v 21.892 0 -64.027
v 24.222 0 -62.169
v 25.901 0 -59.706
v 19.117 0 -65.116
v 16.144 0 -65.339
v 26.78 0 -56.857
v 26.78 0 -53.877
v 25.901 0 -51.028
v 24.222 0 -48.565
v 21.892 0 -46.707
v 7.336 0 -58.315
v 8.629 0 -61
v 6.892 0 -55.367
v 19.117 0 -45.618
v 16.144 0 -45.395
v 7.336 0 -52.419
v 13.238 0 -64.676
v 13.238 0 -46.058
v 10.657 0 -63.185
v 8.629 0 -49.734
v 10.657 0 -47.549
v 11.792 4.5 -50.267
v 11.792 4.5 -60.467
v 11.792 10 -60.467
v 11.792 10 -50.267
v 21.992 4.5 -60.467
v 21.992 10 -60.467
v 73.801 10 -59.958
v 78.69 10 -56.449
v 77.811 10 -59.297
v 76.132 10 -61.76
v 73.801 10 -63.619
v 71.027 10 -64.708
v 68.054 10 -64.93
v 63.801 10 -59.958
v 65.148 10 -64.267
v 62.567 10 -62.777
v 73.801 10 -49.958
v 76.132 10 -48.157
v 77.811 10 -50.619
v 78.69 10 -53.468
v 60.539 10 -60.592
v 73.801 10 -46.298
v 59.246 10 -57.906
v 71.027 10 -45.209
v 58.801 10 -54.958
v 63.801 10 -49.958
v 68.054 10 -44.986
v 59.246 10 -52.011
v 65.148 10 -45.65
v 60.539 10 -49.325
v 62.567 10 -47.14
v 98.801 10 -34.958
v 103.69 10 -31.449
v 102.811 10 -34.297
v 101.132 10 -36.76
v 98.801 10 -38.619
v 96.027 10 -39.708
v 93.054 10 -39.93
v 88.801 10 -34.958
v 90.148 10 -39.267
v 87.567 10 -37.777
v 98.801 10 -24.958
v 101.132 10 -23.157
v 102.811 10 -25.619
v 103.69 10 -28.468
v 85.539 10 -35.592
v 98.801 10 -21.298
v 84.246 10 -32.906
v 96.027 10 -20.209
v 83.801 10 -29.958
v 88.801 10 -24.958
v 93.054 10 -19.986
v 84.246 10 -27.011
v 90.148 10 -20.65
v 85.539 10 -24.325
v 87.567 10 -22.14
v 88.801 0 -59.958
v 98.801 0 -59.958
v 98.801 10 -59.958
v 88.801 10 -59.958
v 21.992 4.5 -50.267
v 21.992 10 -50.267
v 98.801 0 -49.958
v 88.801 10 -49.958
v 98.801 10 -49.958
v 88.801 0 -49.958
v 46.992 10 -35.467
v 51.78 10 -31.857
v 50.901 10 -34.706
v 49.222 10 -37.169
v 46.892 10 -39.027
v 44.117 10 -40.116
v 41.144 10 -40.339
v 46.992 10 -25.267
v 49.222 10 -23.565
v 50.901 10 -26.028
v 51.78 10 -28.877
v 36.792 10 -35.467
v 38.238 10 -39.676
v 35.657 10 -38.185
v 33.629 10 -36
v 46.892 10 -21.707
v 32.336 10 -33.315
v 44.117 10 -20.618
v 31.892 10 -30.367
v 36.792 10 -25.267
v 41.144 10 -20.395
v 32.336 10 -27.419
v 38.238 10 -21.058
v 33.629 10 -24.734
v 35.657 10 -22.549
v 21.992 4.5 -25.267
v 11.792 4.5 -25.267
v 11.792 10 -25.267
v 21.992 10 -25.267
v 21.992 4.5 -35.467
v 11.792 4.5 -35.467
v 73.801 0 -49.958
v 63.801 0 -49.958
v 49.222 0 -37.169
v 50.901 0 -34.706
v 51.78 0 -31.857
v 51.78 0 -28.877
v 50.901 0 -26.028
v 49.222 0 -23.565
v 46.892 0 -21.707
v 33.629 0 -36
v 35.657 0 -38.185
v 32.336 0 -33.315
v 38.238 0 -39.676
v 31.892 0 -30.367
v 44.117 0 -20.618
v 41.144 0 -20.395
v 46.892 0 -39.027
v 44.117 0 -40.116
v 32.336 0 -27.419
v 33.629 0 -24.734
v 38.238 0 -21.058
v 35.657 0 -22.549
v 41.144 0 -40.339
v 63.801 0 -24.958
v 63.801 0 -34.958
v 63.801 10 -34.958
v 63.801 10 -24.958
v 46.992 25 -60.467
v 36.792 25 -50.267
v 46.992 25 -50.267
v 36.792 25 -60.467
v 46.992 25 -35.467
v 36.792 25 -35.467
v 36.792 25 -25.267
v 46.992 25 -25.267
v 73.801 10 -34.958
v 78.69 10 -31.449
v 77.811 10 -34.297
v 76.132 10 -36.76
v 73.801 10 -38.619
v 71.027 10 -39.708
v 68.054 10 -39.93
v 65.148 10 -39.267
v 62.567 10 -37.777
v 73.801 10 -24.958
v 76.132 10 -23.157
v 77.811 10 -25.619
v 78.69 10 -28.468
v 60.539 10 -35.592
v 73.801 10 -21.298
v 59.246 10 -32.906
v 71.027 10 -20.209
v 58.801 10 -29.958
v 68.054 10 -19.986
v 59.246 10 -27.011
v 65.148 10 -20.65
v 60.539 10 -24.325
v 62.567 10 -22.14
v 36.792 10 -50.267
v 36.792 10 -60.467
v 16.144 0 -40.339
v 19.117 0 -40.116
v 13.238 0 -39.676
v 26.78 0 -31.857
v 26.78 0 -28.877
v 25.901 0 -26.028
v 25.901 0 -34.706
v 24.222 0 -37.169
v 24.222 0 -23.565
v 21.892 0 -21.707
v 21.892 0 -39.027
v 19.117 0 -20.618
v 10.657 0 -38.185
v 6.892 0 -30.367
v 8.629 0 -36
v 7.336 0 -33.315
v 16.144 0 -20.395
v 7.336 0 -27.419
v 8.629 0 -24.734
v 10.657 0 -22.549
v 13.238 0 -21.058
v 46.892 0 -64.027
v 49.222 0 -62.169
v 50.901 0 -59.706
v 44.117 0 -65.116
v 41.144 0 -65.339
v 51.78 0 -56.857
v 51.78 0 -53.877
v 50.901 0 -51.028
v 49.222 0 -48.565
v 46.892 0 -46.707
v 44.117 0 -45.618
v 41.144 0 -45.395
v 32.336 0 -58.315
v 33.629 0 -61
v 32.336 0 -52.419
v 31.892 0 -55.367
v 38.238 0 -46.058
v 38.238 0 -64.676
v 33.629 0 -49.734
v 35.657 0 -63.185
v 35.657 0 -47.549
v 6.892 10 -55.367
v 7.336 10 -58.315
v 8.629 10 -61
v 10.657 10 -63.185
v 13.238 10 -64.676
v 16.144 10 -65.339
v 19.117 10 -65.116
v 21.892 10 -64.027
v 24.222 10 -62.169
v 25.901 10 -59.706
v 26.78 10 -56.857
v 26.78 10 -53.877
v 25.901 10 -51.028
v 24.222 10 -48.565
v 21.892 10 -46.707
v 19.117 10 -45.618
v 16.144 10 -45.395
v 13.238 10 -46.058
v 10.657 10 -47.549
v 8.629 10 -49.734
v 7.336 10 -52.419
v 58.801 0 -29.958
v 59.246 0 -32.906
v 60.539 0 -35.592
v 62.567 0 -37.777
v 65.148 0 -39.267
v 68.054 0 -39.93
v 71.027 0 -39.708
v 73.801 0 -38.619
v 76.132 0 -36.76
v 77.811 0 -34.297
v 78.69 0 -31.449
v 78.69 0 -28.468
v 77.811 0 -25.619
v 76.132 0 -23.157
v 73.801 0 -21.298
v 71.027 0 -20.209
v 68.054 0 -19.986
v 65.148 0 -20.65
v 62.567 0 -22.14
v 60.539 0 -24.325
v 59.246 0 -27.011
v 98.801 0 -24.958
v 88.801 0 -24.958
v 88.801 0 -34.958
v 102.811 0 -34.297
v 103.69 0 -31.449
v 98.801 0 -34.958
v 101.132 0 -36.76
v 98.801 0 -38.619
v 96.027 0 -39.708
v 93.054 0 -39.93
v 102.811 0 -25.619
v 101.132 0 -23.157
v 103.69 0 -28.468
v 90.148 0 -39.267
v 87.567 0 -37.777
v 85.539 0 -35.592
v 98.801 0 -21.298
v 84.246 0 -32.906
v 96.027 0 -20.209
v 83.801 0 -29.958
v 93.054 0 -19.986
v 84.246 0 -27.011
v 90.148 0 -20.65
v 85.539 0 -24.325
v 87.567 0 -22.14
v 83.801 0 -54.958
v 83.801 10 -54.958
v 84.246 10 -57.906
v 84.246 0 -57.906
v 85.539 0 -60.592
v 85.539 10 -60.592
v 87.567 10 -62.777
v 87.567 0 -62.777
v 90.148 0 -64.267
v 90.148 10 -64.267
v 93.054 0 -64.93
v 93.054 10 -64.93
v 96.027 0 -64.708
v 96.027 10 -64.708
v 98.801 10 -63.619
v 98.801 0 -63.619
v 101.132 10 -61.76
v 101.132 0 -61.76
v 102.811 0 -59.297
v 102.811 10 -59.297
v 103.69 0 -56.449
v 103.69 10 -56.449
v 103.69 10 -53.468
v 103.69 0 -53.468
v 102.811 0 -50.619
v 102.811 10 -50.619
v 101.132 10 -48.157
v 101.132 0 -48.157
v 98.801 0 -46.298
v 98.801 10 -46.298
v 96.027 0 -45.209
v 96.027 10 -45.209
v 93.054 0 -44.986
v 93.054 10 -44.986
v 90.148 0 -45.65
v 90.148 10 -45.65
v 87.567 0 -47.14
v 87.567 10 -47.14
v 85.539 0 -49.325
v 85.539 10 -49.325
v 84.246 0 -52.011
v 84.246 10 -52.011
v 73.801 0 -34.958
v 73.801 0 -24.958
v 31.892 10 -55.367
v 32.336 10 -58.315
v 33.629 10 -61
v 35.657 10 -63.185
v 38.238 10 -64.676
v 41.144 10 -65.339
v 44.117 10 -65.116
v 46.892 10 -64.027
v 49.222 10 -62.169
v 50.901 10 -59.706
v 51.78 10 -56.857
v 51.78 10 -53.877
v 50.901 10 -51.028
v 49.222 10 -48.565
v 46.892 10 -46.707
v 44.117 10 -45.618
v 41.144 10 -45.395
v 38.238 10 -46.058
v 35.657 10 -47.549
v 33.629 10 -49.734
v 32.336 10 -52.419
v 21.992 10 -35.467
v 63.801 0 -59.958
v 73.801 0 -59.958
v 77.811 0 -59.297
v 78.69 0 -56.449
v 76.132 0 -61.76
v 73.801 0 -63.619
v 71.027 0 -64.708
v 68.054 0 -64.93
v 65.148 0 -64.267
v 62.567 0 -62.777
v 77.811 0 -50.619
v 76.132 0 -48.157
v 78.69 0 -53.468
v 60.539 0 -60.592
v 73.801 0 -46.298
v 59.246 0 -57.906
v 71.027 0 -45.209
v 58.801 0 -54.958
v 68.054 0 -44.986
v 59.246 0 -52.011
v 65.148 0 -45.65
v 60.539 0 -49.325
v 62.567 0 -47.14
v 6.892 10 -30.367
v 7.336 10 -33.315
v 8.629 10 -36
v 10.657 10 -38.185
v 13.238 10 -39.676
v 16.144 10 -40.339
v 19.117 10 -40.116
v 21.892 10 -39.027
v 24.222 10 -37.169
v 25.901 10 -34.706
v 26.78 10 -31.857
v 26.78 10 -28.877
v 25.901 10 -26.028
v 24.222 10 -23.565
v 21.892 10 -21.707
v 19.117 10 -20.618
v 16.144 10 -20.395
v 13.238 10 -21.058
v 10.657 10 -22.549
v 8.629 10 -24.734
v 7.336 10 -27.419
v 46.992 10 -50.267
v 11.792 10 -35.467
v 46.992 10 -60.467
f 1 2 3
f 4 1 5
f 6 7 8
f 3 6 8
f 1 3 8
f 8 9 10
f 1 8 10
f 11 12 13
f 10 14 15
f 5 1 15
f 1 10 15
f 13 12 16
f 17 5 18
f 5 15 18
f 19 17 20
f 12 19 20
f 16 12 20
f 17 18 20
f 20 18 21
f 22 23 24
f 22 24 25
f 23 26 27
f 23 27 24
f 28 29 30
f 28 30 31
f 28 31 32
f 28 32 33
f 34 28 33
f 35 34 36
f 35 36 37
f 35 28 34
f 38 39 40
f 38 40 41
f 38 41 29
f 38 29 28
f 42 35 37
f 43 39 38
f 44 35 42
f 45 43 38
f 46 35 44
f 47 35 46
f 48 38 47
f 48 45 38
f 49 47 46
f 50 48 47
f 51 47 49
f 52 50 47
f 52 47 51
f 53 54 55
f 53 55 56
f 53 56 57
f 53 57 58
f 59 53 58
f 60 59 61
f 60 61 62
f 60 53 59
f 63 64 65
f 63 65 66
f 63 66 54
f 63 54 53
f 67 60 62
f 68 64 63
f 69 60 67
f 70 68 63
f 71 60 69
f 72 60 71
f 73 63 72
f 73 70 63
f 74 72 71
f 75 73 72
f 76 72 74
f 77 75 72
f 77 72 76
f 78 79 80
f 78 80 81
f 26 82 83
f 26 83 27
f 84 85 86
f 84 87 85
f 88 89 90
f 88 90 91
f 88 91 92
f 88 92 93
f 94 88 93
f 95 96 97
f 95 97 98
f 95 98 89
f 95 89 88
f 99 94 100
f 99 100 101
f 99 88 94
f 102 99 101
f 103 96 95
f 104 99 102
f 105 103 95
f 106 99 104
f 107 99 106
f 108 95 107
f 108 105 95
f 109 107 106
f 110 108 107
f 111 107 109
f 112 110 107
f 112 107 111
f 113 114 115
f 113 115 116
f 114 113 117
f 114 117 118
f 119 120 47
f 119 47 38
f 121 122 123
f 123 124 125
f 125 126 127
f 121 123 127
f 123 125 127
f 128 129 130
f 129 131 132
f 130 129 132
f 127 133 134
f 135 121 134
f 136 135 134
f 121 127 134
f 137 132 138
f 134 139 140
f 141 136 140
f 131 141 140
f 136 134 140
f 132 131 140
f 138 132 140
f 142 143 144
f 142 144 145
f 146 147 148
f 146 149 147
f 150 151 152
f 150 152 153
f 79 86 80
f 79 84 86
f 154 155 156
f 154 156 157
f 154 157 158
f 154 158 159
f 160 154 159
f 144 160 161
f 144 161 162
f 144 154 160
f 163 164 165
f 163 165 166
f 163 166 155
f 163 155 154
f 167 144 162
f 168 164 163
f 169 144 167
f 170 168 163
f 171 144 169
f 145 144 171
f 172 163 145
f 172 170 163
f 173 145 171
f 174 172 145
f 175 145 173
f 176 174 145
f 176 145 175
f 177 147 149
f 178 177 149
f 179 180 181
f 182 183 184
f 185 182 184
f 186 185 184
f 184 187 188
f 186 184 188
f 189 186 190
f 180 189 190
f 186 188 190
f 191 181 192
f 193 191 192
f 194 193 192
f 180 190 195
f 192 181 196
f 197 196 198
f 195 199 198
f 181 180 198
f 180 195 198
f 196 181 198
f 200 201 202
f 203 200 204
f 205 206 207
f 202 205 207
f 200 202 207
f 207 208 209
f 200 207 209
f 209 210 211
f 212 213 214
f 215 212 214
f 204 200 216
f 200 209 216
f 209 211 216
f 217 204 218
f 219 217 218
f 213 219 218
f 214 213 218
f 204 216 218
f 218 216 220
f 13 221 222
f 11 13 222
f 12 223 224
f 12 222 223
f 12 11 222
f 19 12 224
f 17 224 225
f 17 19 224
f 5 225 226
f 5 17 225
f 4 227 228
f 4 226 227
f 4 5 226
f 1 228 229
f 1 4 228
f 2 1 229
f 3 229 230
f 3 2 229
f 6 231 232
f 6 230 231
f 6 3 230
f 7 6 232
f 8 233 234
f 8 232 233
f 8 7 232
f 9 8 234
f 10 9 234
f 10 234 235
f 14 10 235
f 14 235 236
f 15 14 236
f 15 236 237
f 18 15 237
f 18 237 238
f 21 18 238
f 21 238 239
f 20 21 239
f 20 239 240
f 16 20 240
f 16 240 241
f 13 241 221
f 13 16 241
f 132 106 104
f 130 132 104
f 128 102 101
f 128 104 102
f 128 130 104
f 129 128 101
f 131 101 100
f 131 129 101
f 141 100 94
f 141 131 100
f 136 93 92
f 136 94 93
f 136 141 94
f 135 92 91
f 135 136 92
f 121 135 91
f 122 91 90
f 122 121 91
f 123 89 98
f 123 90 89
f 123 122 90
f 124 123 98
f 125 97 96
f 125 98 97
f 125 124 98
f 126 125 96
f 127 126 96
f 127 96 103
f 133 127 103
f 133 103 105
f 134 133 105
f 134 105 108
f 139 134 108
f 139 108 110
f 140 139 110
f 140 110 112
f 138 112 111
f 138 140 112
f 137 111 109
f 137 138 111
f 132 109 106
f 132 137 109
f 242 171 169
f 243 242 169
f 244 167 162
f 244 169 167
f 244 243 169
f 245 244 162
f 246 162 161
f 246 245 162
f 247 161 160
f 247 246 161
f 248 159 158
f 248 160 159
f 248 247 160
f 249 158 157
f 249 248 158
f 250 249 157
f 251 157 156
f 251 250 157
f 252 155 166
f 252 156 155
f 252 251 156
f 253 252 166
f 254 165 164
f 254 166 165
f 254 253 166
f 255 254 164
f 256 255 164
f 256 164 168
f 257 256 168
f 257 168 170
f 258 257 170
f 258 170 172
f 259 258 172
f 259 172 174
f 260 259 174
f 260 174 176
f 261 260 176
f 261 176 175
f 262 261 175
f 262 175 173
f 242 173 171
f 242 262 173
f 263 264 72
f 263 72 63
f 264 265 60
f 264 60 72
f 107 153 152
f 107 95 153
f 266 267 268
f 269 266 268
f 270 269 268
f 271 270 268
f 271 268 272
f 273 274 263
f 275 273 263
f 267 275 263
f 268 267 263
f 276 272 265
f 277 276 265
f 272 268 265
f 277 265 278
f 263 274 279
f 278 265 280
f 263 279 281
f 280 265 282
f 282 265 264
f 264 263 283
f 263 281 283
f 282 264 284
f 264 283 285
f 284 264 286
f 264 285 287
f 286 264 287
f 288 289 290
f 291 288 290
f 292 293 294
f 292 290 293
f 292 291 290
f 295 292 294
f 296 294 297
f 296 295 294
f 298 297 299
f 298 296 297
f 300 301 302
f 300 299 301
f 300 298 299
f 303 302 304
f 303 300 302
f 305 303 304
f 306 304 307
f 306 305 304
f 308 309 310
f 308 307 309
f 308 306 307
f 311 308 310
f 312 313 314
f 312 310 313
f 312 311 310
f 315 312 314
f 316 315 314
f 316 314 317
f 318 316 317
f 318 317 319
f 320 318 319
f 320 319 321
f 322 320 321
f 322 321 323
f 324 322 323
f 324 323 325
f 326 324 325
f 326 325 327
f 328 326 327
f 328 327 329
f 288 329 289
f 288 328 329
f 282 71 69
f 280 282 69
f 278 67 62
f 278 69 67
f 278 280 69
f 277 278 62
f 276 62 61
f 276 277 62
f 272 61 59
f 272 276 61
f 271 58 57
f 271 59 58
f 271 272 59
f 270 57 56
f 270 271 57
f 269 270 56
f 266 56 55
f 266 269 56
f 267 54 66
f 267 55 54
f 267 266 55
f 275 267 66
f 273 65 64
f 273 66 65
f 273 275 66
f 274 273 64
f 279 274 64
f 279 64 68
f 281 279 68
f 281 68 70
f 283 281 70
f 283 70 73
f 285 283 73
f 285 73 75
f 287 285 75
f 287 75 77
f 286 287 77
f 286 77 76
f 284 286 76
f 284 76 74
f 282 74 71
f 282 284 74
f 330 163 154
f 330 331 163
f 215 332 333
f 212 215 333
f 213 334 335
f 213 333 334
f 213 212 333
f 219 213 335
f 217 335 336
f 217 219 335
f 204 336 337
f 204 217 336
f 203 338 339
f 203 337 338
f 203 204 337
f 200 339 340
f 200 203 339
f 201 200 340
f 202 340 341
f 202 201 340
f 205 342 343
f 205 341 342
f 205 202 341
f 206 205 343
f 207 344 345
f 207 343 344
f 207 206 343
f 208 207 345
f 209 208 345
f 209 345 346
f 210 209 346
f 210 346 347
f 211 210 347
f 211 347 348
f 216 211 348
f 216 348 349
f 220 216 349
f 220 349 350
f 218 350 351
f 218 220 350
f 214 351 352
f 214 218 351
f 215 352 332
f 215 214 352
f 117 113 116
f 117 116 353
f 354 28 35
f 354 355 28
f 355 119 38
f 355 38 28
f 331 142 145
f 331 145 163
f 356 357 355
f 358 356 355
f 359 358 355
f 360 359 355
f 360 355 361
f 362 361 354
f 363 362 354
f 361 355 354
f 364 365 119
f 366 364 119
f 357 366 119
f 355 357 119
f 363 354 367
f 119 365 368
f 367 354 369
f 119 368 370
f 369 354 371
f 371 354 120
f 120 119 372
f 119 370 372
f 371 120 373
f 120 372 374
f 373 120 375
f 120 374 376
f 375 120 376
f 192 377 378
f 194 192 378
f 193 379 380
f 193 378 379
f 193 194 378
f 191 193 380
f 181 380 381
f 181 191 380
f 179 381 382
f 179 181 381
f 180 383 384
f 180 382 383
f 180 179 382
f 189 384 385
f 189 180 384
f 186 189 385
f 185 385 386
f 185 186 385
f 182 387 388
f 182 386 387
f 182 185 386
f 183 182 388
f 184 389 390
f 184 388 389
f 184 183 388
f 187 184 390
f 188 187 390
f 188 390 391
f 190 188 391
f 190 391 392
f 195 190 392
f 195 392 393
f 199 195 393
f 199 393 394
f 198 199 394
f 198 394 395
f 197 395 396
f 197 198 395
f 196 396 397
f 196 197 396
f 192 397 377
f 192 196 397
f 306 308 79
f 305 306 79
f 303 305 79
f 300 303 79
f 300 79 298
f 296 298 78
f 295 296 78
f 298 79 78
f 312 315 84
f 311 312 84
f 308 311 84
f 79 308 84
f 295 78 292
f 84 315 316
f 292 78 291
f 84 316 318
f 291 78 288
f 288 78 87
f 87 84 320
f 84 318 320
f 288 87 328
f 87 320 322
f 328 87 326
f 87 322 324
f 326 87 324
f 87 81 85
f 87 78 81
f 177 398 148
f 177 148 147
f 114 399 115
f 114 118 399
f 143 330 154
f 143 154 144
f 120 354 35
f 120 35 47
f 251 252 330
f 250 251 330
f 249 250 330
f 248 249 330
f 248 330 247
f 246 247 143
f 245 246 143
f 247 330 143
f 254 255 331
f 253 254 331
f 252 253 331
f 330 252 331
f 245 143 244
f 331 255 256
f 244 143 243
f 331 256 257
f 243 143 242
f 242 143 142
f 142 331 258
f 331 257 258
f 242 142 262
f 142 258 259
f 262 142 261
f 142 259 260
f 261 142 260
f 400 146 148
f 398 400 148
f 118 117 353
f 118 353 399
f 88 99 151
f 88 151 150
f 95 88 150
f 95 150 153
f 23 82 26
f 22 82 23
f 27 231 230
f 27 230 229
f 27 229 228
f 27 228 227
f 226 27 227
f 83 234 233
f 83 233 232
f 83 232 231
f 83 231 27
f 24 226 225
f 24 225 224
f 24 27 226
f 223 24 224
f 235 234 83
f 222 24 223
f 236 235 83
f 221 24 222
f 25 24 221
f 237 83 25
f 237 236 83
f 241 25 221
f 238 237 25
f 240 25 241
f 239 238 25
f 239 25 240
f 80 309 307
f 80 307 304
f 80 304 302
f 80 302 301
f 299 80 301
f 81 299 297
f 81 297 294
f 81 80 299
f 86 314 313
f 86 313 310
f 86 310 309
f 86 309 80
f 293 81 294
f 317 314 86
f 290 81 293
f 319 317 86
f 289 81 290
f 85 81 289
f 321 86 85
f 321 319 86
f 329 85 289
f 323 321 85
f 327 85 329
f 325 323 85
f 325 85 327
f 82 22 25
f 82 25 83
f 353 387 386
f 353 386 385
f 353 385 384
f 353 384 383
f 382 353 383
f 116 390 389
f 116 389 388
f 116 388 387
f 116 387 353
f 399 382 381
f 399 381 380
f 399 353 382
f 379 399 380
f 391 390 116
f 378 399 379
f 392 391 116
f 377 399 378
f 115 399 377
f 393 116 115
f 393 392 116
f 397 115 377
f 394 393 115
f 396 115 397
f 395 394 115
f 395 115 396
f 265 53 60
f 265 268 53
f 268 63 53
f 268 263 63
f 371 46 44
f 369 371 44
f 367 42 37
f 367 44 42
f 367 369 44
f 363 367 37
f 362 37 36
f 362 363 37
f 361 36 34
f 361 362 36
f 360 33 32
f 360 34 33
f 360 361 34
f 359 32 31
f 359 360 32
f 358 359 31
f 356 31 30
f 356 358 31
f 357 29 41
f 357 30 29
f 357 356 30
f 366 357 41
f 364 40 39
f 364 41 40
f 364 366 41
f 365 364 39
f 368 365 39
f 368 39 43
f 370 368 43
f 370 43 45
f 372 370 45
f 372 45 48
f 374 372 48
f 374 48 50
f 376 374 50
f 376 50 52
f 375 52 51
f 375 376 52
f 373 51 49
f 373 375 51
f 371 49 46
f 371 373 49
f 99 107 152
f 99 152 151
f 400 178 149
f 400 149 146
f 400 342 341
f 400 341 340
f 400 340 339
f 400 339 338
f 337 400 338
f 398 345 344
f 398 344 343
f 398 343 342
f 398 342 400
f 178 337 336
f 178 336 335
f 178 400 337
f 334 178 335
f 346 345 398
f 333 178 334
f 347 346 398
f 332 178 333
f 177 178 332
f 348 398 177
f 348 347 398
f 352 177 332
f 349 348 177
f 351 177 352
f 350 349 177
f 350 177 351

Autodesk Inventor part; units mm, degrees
ref_plane "YZ Plane" through (0, 0, 0) normal (1, 0, 0) x (0, 1, 0)
ref_plane "XZ Plane" through (0, 0, 0) normal (0, 1, 0) x (-1, 0, 0)
ref_plane "XY Plane" through (0, 0, 0) normal (0, 0, 1) x (1, 0, 0)
sketch "草圖1" plane through (0, 0, 0) normal (0, 1, 0) x (-1, 0, 0)
  line L0 (0, 0) -> (-120, 0)
  line L1 (-120, 0) -> (-120, -120)
  line L2 (-120, -120) -> (0, -120)
  line L3 (0, -120) -> (0, 0)
  dimension "d0" = 120
  dimension "d1" = 120
sketch "草圖2" plane through (0, 0, 0) normal (0, 1, 0) x (-1, 0, 0)
  line L0 (-11.7915, -25.267) -> (-21.9915, -25.267)
  line L1 (-21.9915, -25.267) -> (-21.9915, -35.467)
  line L2 (-21.9915, -35.467) -> (-11.7915, -35.467)
  line L3 (-11.7915, -35.467) -> (-11.7915, -25.267)
  circle A0 centre (-16.8915, -30.367) radius 10
  point P0 (0, 0)
  dimension "d11" = 10.2
  dimension "d12" = 10.2
  dimension "d13" = 20
extrude "擠出1" add sketch "草圖2" along normal blind 10
extrude "擠出2" add sketch "草圖2" along normal blind 4.5 contours L3 L2 L1 L0
pattern_linear "矩形陣列1" count 2 spacing 25 along (0, 0, -1) count 2 spacing 25 along (1, 0, 0) of "擠出1", "擠出2"
sketch "草圖3" plane through (0, 0, 0) normal (0, 1, 0) x (-1, 0, 0)
  circle A0 centre (-68.8014, -29.9583) radius 10
  line L0 (-63.8014, -24.9583) -> (-73.8014, -24.9583)
  line L1 (-73.8014, -24.9583) -> (-73.8014, -34.9583)
  line L2 (-73.8014, -34.9583) -> (-63.8014, -34.9583)
  line L3 (-63.8014, -34.9583) -> (-63.8014, -24.9583)
  line L4 (-63.8014, -24.9583) -> (-73.8014, -34.9583) construction
  line L5 (-73.8014, -24.9583) -> (-63.8014, -34.9583) construction
  point P0 (0, 0)
  dimension "d32" = 20
  dimension "d33" = 10
  dimension "d34" = 10
extrude "擠出3" add sketch "草圖3" along normal blind 10
pattern_linear "矩形陣列2" count 2 spacing 25 along (0, 0, -1) count 2 spacing 25 along (1, 0, 0) of "擠出3"
sketch "草圖4" plane through (36.7915, 4.5, -60.467) normal (0, 1, 0) x (1, 0, 0)
  line L0 (0, -10.2) -> (0, 0) projected
  line L1 (10.2, 0) -> (10.2, -10.2) projected
  line L2 (0, 0) -> (10.2, 0)
  line L3 (10.2, 0) -> (10.2, -10.2)
  line L4 (10.2, -10.2) -> (0, -10.2)
  line L5 (0, -10.2) -> (0, 0)
  point P0 (-36.7915, -60.467)
extrude "擠出4" add sketch "草圖4" along normal blind 20.5
sketch "草圖5" plane through (36.7915, 10, -50.267) normal (0, 0, 1) x (1, 0, 0)
  point P0 (-36.7915, -10)
sketch "草圖6" plane through (36.7915, 4.5, -35.467) normal (1, 0, 0) x (0, 0, -1)
  point P0 (-35.467, -4.5)
pattern_linear "矩形陣列3" count 2 spacing 25 along (0, 0, 1) of "擠出4"
properties part number "print1030_1"
